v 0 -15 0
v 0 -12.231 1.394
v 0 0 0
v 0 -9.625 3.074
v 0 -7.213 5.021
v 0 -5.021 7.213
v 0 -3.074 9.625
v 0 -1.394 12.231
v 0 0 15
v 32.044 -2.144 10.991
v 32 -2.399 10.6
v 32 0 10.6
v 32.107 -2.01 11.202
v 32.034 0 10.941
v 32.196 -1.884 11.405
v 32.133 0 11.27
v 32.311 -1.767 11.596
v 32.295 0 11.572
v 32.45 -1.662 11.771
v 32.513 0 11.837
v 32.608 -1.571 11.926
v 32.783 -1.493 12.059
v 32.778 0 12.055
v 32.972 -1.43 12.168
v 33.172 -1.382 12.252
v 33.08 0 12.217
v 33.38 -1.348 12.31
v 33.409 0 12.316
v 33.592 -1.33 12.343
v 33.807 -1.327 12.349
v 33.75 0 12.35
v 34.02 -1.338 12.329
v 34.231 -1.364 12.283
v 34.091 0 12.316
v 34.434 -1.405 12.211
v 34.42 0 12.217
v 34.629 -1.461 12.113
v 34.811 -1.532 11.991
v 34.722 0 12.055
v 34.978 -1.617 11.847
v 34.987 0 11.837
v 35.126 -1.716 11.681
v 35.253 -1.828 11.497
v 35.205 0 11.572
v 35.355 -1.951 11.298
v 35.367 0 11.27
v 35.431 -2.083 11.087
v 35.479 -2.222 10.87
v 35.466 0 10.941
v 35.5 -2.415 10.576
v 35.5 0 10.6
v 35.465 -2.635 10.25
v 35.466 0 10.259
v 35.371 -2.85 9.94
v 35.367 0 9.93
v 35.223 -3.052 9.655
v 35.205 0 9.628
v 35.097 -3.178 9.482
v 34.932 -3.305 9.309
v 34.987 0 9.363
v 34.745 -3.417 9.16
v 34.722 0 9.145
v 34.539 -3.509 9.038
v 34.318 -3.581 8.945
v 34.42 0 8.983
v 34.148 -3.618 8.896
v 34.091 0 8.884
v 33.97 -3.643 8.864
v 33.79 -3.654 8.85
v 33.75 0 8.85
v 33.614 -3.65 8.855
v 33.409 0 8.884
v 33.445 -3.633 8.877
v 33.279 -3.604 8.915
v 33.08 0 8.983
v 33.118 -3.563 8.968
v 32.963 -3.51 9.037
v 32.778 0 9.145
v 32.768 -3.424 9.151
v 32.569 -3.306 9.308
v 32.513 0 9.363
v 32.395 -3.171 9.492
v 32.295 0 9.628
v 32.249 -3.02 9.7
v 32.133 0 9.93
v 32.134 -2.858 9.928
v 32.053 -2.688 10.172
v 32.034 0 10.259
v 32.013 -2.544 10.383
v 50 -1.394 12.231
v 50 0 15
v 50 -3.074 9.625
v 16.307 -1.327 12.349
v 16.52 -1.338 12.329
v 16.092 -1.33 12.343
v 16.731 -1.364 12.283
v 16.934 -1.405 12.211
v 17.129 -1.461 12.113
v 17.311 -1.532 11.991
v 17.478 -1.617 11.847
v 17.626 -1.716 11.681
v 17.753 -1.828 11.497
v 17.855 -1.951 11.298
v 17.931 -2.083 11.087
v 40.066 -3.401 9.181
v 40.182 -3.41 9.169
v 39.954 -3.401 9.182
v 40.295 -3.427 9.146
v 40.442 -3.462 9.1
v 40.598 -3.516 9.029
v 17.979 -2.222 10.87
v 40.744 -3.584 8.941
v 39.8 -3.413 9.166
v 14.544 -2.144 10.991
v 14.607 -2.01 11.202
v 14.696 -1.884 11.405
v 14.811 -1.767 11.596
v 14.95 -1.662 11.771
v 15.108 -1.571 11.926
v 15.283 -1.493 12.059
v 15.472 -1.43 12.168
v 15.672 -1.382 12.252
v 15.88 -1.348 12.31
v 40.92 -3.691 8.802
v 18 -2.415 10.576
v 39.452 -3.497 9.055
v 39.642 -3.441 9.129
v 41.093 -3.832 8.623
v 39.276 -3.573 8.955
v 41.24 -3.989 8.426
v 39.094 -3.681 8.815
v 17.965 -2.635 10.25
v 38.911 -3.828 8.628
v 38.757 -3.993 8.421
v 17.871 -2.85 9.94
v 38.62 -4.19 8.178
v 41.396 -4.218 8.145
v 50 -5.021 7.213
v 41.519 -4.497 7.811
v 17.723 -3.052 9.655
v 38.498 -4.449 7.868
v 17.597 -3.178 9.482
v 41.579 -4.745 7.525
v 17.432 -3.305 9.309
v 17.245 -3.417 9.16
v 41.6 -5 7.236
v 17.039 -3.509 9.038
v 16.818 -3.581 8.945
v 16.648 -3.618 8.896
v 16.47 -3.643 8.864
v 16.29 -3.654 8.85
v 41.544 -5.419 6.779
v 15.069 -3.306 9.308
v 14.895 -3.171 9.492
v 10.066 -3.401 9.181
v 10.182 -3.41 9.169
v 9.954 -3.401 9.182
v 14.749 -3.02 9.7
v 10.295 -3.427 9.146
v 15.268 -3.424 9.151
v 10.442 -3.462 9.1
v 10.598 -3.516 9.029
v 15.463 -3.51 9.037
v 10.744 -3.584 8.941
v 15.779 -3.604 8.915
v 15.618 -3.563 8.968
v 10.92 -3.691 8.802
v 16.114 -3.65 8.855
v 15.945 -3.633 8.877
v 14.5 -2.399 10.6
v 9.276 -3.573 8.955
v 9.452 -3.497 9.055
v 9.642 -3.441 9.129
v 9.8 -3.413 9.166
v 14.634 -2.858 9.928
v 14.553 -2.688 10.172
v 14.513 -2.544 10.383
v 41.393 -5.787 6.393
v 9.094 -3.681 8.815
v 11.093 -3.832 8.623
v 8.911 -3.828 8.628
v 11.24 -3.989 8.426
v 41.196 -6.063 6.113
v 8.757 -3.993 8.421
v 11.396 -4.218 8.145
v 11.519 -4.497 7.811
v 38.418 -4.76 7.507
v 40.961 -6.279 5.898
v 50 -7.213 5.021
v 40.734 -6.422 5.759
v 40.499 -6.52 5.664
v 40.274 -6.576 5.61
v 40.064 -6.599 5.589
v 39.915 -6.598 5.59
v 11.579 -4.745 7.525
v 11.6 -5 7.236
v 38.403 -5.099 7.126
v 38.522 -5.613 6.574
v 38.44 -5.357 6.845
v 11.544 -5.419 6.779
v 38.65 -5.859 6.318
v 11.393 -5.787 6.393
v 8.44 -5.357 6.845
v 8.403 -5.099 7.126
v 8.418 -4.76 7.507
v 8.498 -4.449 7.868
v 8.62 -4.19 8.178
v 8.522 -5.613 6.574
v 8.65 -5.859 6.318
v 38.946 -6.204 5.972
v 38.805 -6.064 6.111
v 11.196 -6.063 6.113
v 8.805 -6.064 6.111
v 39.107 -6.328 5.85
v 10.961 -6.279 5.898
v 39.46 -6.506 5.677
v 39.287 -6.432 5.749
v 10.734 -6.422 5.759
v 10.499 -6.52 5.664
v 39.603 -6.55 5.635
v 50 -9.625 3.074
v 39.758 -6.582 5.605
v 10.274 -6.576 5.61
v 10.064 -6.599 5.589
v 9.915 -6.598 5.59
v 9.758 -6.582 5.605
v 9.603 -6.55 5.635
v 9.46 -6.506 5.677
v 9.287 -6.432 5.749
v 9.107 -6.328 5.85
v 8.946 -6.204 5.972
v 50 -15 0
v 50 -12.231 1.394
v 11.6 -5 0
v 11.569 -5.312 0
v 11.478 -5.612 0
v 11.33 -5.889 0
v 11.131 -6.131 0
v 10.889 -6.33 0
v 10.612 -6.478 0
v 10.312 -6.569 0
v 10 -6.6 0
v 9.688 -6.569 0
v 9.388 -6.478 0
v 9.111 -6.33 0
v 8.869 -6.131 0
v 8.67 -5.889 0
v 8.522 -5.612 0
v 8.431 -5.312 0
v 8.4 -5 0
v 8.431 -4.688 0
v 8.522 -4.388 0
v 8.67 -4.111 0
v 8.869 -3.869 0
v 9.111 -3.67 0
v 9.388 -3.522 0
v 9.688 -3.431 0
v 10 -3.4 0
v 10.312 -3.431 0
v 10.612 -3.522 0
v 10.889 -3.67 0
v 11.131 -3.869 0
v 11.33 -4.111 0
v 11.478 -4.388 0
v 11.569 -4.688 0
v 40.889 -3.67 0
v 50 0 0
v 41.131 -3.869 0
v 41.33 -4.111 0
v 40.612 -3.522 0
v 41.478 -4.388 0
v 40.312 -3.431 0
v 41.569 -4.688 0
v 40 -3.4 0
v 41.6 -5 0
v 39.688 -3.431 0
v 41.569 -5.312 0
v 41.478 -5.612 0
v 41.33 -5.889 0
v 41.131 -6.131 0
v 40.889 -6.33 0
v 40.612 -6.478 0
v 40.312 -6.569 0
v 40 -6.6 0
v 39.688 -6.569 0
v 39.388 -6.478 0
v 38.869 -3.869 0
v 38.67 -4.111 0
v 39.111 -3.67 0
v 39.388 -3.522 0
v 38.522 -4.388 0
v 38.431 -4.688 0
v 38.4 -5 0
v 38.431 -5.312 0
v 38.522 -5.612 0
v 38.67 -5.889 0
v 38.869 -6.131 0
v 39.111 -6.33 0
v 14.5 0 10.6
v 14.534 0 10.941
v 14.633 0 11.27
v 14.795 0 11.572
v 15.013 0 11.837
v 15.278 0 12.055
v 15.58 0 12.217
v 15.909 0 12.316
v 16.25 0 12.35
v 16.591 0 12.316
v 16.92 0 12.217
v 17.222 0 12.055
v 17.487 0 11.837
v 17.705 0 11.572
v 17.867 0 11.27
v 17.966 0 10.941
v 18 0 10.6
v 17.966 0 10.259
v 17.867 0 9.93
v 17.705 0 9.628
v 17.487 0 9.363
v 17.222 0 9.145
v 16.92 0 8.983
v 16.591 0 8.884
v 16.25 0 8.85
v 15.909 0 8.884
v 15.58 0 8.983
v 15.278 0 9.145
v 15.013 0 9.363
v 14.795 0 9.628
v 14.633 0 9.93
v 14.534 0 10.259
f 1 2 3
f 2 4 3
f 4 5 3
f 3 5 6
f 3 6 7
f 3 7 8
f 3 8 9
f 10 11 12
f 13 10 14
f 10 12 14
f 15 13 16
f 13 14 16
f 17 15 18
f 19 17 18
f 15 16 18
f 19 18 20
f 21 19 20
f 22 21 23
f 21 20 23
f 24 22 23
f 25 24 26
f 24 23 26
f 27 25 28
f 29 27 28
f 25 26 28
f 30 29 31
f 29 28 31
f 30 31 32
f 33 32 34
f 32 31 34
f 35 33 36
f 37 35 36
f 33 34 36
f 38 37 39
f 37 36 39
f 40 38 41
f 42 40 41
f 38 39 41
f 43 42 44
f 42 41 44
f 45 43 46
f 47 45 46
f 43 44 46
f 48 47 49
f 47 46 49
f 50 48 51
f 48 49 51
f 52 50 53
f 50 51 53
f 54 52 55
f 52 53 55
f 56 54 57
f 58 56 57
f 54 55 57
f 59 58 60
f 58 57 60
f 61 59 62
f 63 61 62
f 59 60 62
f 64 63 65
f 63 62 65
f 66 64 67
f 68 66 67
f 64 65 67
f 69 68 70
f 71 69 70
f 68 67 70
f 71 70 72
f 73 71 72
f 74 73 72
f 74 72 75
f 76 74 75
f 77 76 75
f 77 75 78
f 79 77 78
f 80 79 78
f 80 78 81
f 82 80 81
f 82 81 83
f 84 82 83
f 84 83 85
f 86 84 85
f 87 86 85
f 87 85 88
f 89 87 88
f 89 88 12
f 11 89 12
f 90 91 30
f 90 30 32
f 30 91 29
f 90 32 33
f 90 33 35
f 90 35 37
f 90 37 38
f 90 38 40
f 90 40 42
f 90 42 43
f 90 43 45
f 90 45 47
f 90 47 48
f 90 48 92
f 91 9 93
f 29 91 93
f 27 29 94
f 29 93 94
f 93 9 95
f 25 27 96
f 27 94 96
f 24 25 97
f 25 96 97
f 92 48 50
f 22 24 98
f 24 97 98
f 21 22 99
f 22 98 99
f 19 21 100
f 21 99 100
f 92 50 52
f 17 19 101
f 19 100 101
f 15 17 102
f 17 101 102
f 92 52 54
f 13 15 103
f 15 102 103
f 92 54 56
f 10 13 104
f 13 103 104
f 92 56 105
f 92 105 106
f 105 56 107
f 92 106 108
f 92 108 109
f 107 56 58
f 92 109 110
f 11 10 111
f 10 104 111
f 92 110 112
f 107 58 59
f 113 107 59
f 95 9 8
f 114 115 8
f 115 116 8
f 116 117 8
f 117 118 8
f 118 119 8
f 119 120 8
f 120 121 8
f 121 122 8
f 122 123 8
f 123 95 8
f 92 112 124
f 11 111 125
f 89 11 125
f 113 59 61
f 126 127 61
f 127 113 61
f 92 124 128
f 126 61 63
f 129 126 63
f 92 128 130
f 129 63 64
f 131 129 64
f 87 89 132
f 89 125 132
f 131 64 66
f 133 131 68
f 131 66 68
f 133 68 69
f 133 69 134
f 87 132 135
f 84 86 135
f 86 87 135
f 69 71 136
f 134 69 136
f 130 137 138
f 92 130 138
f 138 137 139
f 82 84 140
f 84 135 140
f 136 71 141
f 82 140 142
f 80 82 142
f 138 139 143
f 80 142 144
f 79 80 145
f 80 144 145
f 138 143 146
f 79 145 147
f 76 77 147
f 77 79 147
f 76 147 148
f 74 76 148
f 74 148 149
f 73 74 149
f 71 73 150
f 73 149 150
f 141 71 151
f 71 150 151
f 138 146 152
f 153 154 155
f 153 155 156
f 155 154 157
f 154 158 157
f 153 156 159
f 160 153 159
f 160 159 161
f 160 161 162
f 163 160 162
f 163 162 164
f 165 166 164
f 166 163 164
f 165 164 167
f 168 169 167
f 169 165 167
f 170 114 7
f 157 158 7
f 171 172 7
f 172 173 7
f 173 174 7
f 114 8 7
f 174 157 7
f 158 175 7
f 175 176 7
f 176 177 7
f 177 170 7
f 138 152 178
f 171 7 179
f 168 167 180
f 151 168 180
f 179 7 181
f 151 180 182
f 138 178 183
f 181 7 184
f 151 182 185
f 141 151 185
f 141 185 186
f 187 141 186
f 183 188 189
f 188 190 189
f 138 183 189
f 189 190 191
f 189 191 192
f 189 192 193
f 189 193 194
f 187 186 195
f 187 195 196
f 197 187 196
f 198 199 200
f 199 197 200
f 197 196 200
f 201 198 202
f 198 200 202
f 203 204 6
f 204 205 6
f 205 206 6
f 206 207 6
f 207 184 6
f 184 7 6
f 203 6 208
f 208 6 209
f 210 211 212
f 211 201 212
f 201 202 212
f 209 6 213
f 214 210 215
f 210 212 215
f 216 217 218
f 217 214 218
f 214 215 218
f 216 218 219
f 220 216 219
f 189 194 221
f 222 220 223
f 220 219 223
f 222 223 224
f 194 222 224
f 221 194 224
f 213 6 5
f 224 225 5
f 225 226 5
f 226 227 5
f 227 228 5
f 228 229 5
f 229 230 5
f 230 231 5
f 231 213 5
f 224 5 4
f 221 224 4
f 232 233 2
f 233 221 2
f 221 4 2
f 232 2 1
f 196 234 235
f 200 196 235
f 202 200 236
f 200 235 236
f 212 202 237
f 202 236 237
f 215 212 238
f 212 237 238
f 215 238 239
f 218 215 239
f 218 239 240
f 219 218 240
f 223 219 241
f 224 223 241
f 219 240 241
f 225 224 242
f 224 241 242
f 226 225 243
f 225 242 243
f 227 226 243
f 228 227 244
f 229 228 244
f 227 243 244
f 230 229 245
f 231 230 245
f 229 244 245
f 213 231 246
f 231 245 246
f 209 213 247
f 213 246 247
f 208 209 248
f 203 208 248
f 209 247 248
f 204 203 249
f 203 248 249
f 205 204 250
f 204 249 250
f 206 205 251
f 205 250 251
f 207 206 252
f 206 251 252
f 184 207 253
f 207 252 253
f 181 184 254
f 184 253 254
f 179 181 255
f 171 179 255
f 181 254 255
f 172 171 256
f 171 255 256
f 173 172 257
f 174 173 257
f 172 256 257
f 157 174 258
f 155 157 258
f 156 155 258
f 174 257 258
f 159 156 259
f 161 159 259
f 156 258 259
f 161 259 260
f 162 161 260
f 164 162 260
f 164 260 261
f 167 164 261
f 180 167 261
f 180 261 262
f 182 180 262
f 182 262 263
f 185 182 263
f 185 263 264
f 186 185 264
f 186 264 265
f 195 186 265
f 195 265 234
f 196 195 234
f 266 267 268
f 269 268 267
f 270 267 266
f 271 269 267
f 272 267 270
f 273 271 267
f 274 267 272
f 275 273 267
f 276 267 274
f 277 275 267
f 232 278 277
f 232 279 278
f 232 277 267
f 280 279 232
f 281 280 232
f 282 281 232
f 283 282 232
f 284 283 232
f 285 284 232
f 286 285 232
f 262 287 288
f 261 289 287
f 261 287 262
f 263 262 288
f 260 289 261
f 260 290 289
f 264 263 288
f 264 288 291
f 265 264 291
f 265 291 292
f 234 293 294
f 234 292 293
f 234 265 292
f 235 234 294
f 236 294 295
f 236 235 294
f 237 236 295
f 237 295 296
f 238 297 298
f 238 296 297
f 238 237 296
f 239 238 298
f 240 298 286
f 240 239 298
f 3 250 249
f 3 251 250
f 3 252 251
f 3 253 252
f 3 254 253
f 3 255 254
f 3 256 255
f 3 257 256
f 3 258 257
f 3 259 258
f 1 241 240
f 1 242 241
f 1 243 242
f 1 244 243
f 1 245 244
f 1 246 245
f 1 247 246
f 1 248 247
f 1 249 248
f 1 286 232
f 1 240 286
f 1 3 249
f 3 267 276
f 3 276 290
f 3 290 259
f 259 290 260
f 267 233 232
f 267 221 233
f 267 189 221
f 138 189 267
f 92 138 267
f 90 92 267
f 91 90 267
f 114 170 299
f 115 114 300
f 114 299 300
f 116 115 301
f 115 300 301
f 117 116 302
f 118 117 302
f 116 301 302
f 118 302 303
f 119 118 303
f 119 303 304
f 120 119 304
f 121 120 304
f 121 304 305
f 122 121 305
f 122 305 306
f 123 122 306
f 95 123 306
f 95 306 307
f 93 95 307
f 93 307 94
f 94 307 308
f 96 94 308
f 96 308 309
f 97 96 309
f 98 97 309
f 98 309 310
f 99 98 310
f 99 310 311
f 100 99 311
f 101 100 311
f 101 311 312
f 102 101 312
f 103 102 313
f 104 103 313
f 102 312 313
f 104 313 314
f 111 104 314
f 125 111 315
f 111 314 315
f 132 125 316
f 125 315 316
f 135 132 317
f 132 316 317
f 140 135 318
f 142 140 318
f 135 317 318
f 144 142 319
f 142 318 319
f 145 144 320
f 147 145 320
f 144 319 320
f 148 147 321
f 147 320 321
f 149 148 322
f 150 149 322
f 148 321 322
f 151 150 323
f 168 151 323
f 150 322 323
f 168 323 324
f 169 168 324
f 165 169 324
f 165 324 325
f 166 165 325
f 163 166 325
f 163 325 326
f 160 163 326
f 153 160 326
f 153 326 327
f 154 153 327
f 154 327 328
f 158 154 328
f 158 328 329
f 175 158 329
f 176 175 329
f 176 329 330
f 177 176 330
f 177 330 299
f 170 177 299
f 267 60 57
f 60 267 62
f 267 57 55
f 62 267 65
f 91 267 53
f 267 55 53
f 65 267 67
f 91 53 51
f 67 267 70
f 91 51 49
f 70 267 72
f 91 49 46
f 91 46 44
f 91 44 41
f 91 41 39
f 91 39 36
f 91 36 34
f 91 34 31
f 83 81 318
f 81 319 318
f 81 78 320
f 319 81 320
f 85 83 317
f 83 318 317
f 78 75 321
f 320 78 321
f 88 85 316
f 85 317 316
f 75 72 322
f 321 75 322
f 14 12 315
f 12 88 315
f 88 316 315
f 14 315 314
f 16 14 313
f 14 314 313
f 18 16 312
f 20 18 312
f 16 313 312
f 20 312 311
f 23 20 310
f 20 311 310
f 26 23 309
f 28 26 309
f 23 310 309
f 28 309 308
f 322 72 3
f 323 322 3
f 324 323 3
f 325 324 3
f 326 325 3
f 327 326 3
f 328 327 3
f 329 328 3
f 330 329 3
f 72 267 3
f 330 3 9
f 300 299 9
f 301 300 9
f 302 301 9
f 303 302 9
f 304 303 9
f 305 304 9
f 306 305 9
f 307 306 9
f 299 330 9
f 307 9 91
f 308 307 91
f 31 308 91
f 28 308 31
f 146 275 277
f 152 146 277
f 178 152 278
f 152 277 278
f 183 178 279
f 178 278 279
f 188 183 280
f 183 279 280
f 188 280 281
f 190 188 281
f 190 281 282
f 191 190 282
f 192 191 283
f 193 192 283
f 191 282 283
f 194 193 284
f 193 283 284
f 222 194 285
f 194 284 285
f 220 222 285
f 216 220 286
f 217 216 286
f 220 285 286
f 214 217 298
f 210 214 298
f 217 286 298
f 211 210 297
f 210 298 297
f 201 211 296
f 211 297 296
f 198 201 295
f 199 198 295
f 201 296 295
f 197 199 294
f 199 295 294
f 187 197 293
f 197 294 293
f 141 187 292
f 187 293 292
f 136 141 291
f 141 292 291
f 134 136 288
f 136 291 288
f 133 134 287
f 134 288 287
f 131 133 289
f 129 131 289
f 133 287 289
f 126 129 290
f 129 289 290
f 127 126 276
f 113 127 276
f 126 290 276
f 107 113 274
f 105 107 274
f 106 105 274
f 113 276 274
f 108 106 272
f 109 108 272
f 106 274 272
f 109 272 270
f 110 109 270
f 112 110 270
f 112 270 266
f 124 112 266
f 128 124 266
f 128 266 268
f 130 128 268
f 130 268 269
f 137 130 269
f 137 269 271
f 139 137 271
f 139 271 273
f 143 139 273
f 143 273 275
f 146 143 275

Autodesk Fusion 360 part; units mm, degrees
sketch "Boceto1" plane through (0, 0, 0) normal (1, 0, 0) x (0, 1, 0)
  line L0 (0, 0) -> (0, 15)
  line L1 (0, 0) -> (-15, 0)
  arc A0 (-15, 0) -> (0, 15) centre (-26.7073, 26.7073) ccw
  dimension "d1" = 15
  dimension "d2" = 15
extrude "Extruir1" add sketch "Boceto1" along normal blind 50
sketch "Boceto2" plane through (0, 0, 0) normal (0, 1, 0) x (-1, 0, 0)
  line L0 (0, 0) -> (0, 15)
  line L1 (0, 15) -> (-50, 15)
  line L2 (-50, 15) -> (-50, 0)
  line L3 (-50, 0) -> (0, 0)
  circle A0 centre (-33.75, 10.6) radius 1.75
  circle A1 centre (-16.25, 10.6) radius 1.75
  dimension "d9" = 3.5
  dimension "d14" = 3.5
extrude "Extruir2" cut sketch "Boceto2" against normal blind 5 contours A0 | A1
sketch "Boceto3" plane through (0, 0, 0) normal (0, 0, -1) x (1, 0, 0)
  line L0 (0, 15) -> (0, 0)
  line L1 (0, 0) -> (50, 0)
  line L2 (50, 0) -> (50, 15)
  line L3 (50, 15) -> (0, 15)
  circle A0 centre (10, 5) radius 1.6
  circle A1 centre (40, 5) radius 1.6
  dimension "d19" = 3.2
  dimension "d22" = 3.2
extrude "Extruir3" cut sketch "Boceto3" against normal blind 11 contours A0 | A1
